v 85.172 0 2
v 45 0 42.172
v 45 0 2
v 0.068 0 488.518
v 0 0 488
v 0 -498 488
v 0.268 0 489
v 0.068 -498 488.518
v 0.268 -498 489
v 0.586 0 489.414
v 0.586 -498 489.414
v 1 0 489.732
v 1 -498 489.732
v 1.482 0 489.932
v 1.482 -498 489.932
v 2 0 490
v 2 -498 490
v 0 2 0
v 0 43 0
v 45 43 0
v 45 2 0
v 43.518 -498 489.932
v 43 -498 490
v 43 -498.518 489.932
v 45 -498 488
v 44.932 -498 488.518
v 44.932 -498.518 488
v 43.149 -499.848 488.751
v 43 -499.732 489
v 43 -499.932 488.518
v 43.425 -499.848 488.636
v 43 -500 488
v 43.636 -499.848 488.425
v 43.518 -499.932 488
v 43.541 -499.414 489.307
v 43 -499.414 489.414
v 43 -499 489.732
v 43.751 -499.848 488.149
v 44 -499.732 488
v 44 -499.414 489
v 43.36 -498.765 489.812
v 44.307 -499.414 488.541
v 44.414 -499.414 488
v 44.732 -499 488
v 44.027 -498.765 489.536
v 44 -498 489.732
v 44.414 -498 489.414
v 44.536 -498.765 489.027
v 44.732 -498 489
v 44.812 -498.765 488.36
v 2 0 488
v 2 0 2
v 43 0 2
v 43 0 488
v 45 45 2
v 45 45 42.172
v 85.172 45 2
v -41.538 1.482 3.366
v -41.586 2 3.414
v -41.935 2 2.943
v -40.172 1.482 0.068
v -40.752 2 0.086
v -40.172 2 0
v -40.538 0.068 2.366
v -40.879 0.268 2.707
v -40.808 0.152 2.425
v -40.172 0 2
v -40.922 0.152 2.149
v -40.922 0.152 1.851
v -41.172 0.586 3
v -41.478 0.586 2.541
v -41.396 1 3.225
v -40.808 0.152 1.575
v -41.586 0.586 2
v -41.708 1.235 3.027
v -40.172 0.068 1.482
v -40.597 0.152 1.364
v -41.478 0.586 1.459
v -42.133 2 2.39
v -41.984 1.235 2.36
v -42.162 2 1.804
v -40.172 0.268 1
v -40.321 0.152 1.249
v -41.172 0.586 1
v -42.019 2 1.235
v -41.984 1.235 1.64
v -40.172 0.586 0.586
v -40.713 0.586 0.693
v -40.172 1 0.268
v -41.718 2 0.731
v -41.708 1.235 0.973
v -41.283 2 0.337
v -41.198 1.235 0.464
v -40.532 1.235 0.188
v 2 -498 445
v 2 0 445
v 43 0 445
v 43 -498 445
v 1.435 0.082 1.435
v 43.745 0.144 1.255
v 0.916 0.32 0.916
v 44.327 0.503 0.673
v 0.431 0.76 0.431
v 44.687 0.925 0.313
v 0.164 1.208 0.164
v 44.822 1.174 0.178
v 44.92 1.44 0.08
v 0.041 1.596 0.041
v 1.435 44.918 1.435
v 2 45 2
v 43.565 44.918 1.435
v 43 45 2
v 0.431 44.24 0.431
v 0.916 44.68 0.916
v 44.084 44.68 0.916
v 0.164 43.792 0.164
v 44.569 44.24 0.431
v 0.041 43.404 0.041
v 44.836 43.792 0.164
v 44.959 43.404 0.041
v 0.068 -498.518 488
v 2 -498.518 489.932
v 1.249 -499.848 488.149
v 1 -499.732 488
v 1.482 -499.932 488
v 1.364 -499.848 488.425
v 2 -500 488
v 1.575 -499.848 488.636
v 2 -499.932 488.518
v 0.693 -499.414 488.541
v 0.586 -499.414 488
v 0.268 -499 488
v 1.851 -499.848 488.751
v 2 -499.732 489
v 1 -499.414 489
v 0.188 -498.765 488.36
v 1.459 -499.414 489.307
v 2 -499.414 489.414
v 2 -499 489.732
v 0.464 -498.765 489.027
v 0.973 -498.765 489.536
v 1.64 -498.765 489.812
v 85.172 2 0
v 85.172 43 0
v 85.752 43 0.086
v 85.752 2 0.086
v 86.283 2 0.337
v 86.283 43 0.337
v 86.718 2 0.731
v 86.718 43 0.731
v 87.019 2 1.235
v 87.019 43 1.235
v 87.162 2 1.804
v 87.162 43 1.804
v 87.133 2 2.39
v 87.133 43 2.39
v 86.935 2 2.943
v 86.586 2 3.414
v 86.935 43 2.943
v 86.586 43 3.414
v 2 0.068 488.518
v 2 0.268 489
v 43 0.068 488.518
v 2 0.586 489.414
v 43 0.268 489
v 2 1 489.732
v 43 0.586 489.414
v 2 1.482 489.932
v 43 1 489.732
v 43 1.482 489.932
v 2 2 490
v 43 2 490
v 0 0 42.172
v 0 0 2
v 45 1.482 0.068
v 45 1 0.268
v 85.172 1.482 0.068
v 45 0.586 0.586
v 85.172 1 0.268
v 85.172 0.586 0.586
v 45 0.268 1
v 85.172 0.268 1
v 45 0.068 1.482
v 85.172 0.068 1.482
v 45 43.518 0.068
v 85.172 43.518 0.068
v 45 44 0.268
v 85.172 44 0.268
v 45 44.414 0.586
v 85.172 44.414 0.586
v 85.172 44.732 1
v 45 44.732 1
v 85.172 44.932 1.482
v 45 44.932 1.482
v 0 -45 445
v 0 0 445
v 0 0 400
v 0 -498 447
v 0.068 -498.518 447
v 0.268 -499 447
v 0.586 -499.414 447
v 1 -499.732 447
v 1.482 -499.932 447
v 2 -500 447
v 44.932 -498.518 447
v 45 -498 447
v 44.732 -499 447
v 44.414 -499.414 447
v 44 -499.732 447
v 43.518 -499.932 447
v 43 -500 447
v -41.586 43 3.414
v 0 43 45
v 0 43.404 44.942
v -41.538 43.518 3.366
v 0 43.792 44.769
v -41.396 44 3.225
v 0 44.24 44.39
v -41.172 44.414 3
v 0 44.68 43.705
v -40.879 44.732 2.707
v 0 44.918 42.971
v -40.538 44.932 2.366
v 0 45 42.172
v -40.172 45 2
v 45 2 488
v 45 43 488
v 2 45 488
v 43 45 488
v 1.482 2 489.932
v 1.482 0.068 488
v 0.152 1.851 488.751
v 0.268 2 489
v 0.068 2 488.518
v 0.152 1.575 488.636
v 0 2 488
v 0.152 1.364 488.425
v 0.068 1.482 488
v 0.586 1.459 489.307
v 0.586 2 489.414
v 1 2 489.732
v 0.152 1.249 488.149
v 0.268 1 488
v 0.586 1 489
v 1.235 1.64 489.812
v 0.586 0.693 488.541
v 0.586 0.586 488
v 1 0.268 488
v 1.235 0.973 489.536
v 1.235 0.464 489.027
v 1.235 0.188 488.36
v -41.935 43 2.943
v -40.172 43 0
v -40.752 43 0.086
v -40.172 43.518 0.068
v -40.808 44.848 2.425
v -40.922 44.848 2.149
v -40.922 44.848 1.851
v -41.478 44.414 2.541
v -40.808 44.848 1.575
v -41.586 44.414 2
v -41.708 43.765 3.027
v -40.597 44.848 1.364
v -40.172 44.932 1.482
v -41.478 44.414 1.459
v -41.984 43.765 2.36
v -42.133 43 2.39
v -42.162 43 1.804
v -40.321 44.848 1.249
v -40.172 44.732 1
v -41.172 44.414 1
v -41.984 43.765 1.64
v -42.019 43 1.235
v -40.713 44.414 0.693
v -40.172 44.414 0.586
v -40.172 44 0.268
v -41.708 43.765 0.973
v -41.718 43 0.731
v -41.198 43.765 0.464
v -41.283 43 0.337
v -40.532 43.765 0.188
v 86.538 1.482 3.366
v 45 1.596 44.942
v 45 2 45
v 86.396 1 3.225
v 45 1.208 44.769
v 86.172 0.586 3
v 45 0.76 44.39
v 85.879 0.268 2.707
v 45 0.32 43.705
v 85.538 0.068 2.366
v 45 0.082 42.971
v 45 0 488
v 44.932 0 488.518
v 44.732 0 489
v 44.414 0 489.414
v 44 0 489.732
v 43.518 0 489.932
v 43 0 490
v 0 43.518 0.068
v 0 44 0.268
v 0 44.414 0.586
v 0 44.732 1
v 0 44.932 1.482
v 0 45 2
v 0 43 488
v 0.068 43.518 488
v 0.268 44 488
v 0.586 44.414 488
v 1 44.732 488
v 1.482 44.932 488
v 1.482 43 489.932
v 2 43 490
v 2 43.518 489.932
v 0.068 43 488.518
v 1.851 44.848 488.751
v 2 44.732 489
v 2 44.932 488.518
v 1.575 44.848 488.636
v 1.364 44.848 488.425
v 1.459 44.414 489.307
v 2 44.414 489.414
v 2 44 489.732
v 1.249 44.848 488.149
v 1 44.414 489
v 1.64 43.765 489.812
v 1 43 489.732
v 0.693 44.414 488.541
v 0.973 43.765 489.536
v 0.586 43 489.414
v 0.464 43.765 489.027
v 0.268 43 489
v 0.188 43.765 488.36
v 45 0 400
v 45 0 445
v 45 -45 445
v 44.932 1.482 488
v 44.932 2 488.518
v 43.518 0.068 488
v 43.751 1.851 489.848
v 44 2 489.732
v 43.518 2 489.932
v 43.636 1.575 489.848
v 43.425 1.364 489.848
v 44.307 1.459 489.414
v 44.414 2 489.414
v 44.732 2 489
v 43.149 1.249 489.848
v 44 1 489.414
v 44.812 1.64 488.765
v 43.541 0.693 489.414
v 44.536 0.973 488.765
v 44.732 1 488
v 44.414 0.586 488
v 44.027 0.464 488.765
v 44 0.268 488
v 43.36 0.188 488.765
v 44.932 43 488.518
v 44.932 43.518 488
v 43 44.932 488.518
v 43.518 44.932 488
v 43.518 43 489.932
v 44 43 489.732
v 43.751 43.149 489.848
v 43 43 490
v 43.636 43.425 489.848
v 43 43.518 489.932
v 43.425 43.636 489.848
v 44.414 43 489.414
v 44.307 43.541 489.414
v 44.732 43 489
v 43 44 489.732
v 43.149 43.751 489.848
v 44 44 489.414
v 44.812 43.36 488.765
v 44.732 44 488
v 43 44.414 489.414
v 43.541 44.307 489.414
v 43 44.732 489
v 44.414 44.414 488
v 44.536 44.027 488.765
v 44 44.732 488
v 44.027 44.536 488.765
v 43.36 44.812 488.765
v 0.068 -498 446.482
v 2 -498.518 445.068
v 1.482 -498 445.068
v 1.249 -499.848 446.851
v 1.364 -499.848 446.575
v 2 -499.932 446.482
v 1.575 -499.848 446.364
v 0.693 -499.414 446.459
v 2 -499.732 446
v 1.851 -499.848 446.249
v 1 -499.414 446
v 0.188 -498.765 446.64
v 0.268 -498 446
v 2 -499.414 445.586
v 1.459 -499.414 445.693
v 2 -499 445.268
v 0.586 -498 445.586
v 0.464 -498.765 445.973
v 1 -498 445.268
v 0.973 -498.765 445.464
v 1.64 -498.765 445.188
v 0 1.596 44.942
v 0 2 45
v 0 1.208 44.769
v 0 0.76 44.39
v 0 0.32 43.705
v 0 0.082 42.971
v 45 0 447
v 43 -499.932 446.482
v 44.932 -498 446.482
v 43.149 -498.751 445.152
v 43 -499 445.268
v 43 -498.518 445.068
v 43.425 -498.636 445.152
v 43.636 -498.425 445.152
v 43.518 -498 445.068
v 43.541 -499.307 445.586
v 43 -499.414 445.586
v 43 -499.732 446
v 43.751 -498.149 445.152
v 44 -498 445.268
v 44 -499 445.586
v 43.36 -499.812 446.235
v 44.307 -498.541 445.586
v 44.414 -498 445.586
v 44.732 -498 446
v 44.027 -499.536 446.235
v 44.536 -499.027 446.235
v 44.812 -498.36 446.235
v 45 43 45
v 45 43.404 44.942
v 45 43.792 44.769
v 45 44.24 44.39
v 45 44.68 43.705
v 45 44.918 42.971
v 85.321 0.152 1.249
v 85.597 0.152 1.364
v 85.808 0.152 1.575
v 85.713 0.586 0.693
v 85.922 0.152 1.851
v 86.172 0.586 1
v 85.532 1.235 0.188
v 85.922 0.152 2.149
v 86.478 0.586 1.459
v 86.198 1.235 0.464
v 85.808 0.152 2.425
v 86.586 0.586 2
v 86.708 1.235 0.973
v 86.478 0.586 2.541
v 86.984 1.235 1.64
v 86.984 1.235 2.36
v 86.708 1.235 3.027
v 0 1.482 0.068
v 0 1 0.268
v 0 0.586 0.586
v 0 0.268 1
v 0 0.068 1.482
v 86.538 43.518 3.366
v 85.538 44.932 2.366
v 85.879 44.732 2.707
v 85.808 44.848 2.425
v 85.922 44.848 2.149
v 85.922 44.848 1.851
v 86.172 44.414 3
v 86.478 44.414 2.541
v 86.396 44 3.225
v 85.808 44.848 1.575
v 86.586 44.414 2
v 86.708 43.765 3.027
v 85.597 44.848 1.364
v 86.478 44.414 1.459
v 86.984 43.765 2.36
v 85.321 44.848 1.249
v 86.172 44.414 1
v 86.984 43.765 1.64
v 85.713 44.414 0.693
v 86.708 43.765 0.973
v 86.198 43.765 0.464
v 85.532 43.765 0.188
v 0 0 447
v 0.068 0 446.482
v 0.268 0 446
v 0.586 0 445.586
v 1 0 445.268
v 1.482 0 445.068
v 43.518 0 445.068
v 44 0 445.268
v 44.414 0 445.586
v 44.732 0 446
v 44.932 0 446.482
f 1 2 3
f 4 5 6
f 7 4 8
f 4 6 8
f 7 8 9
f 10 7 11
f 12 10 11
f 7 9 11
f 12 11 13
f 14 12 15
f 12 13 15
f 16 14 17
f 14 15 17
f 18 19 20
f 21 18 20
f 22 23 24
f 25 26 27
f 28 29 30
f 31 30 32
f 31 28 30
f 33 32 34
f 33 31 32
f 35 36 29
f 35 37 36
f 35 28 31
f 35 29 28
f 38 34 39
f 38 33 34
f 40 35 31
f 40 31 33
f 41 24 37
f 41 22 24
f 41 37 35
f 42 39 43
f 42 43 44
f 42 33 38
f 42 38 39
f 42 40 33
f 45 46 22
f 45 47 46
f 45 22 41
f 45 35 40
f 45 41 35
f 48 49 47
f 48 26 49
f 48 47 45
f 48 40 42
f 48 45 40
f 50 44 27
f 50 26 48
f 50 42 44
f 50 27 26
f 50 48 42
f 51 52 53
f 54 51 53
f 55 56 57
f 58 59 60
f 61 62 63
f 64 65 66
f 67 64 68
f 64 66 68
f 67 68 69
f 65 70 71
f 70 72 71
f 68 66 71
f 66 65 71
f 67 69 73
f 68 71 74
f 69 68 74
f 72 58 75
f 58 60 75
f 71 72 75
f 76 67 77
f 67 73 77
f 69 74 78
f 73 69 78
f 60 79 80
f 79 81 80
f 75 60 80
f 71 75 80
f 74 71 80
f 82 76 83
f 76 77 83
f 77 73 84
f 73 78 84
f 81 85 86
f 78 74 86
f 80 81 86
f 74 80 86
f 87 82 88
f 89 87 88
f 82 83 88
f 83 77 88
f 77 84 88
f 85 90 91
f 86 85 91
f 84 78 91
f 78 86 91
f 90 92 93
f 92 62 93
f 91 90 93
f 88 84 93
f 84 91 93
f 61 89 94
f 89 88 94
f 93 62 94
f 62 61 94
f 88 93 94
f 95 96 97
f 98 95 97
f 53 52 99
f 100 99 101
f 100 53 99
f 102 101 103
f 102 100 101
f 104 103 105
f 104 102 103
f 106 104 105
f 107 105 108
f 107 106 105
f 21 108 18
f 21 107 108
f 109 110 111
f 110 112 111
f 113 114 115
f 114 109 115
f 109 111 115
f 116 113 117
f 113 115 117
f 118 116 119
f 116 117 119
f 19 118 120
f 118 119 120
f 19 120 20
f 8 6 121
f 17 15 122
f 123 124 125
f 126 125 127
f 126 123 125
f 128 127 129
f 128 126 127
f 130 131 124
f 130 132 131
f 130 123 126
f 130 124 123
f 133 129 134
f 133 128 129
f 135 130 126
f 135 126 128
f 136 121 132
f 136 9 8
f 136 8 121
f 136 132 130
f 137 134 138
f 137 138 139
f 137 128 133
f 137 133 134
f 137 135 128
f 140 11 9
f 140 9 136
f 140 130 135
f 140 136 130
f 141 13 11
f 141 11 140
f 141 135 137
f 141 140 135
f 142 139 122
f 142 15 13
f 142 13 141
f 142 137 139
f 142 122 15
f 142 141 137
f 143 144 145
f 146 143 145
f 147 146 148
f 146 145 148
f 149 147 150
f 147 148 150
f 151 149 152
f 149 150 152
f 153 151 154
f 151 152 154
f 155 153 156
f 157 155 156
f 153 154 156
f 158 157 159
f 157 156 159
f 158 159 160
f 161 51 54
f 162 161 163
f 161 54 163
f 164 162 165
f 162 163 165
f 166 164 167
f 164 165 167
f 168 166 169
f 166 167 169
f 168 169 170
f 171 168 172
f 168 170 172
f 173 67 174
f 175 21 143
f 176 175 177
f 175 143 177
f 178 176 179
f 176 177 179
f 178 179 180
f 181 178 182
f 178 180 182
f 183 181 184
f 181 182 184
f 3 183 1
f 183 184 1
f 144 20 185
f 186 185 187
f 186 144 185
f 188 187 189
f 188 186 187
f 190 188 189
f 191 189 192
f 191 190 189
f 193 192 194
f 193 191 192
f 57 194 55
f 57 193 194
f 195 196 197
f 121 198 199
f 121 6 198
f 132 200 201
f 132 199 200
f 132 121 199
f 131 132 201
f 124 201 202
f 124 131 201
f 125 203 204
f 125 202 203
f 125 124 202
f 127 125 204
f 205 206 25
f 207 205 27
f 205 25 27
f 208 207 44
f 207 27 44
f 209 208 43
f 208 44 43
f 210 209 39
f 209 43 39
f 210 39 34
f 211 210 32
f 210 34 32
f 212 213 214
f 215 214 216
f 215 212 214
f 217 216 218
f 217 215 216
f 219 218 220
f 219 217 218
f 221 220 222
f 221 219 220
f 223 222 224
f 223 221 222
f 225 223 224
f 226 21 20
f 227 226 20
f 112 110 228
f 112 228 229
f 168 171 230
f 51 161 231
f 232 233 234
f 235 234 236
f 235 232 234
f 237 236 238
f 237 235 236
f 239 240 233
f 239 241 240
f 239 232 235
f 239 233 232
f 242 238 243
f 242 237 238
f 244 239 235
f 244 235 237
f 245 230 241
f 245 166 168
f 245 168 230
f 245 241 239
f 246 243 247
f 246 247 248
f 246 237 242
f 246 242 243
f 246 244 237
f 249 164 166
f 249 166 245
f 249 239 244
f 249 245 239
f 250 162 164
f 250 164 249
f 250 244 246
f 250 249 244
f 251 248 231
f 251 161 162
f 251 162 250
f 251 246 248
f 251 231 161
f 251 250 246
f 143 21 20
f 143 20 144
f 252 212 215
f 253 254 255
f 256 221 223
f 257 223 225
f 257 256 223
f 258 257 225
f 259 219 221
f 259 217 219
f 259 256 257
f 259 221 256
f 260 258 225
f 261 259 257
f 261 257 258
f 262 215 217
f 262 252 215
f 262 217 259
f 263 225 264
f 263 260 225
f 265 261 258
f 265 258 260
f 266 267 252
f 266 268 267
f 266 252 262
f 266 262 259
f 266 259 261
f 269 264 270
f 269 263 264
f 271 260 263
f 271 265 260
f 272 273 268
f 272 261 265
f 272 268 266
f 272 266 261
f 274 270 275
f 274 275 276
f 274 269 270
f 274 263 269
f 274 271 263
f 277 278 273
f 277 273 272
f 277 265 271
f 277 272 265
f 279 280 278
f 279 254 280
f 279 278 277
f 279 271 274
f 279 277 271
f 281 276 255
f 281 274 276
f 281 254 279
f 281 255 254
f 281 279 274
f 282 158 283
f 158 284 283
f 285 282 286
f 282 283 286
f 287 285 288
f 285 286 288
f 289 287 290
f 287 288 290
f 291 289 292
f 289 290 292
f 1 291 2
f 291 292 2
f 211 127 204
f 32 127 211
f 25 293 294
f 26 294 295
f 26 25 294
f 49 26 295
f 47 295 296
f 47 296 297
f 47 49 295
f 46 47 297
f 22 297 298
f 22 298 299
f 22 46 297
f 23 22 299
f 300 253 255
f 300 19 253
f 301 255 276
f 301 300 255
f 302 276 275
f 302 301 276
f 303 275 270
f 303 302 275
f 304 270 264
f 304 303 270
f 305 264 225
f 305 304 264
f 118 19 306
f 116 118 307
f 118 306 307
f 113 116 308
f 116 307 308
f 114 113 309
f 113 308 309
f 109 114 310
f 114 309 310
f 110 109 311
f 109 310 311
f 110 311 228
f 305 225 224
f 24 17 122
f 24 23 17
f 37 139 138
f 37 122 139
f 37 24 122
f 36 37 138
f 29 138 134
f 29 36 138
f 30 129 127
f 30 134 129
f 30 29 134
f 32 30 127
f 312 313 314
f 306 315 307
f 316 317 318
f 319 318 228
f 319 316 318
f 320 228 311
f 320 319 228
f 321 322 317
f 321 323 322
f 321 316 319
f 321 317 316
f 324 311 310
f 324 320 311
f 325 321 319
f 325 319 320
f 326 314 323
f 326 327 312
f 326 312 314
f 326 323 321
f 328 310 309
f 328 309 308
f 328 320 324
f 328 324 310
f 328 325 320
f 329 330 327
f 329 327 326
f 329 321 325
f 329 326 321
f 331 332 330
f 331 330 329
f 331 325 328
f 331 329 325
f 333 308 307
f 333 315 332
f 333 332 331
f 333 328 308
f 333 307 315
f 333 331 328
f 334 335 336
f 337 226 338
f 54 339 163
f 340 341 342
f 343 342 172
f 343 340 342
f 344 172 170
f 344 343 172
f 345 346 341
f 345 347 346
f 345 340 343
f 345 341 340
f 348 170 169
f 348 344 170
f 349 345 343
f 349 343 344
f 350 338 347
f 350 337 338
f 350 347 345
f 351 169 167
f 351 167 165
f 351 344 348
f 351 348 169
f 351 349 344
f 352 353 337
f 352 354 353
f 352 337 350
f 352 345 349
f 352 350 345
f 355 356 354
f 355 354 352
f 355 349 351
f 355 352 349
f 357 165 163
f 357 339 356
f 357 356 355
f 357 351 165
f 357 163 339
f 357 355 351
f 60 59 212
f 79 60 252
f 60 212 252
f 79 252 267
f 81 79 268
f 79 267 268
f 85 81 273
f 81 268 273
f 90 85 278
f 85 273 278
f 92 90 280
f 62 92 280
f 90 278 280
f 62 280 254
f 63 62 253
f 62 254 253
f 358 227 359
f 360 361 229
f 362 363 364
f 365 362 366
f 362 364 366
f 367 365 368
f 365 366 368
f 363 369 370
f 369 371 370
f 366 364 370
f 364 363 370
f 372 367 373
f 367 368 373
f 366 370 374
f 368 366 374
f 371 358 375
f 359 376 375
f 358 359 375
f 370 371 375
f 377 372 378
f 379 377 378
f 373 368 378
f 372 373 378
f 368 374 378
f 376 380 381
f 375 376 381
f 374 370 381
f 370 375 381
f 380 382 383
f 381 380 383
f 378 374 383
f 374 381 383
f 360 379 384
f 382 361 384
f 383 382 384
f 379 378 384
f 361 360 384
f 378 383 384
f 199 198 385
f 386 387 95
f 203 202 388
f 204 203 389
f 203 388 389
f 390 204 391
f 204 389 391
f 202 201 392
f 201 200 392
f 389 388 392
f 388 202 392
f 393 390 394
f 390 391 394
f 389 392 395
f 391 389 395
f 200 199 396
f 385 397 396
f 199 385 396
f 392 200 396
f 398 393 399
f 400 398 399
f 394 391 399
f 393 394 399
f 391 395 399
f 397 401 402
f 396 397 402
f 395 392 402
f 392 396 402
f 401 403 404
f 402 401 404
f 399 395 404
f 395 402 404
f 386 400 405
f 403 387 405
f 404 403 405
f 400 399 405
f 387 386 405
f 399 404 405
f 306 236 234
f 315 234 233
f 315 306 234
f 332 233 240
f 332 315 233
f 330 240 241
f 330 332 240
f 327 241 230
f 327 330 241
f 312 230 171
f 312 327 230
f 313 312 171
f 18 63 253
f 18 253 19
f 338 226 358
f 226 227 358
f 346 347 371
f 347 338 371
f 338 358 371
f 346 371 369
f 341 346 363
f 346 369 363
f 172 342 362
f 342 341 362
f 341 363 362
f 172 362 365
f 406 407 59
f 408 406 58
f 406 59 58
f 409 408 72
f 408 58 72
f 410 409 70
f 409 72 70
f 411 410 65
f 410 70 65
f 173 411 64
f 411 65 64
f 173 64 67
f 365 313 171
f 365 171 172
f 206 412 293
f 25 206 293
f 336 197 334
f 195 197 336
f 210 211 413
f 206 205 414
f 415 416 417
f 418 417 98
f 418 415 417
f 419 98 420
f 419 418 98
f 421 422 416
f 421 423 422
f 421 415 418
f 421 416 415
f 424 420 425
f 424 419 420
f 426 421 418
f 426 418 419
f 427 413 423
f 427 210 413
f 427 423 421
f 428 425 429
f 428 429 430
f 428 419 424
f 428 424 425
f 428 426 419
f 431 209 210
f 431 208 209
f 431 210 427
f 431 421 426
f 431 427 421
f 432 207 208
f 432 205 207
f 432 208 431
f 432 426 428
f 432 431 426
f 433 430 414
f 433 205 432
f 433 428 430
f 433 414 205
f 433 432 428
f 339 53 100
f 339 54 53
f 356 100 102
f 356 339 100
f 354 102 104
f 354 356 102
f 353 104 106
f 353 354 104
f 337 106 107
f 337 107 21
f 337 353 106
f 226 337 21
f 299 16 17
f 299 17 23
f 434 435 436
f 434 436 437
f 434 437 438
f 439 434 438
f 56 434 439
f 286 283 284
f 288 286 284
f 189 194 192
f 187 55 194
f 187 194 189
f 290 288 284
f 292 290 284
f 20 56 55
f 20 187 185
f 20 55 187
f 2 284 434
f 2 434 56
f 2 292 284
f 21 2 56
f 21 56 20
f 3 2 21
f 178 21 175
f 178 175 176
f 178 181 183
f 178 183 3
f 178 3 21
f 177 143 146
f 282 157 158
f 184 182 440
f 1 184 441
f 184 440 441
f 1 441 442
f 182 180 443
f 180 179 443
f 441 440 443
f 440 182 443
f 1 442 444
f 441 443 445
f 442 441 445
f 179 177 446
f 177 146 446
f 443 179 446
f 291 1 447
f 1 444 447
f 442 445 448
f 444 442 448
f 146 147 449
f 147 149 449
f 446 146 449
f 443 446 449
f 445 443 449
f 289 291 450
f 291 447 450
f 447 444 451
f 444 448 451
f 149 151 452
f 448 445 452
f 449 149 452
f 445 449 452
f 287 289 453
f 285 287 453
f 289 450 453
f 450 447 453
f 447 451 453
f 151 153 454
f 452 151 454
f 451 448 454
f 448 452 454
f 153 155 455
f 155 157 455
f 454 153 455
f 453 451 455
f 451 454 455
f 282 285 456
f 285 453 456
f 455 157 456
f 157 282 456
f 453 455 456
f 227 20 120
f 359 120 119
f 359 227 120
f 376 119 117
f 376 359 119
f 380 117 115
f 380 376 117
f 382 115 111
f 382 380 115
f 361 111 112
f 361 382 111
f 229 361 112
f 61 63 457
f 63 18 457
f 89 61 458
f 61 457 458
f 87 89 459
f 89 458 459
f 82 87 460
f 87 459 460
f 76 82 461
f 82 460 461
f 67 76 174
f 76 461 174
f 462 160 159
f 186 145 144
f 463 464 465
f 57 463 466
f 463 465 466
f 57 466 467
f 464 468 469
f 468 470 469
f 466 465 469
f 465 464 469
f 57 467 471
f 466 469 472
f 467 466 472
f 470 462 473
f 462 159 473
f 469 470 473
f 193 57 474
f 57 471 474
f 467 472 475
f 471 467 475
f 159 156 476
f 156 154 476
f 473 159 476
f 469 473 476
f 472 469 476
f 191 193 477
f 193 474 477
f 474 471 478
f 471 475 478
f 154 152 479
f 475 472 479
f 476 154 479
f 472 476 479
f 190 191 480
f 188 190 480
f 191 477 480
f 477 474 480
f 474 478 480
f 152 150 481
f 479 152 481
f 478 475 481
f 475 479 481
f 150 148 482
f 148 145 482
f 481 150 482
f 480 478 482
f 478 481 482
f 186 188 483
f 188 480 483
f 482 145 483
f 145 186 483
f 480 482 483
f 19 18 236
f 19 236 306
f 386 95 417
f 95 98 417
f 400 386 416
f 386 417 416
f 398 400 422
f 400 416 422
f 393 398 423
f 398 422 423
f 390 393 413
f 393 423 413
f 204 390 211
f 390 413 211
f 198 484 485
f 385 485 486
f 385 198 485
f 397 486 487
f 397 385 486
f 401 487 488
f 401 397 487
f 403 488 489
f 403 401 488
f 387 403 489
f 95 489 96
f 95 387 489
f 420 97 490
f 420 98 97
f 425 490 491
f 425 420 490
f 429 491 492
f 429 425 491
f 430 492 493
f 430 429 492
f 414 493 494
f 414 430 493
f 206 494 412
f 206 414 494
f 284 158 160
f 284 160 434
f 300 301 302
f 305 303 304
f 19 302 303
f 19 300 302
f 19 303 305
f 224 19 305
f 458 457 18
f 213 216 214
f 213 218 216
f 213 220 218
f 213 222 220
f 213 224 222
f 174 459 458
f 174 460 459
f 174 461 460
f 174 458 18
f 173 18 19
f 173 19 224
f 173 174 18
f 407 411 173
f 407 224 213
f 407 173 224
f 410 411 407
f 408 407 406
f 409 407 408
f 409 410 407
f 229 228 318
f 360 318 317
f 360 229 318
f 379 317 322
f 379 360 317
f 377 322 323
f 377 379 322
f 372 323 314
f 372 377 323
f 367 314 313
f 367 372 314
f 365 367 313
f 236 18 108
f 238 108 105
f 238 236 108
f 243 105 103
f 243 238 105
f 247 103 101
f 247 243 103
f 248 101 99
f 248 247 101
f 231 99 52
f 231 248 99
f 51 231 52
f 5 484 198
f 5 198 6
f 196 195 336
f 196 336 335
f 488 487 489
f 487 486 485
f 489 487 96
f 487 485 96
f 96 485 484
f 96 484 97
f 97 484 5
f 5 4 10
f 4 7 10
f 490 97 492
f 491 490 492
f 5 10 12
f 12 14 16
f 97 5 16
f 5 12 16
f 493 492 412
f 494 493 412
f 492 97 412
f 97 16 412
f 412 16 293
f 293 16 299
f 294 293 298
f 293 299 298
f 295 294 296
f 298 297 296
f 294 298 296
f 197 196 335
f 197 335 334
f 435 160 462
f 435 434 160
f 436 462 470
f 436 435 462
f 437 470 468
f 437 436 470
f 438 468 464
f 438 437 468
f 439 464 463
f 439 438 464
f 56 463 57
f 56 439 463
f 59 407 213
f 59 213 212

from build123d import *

# Parameters (mm, degrees)
F0_W     = 45
F0_H     = 45
F1_DEPTH = 490
F3_DEPTH = 45
F4_W     = 45
F4_H     = 45
F5_DEPTH = 500
F6_R     = 2
F6_2_R   = 2
F6_3_R   = 2
F6_4_R   = 2
F8_DEPTH = 45


with BuildPart() as f1:
    # F0 (on Top) → F1 (new body)
    with BuildSketch(Plane.XY):
        with Locations((22.5, 22.5)):
            Rectangle(F0_W, F0_H)
    extrude(amount=F1_DEPTH)

    # F6#2
    f6_2_edges = [f1.edges().sort_by_distance(p)[0] for p in [
        (45, 0, 245),
        (45, 45, 245),
        (45, 22.5, 490),
        (22.5, 0, 490),
        (0, 22.5, 490),
        (22.5, 45, 490),
        (0, 0, 245),
        (0, 45, 245),
        (22.5, 0, 0),
        (22.5, 45, 0),
    ]]
    fillet(f6_2_edges, radius=F6_2_R)


with BuildPart() as f3:
    # F2 (on Front) → F3 (new body)
    with BuildSketch(Plane.XZ):
        Polygon((0, 0), (0, 45), (-45, 0), align=None)
    extrude(amount=-F3_DEPTH)

    # F6#3
    f6_3_edges = [f3.edges().sort_by_distance(p)[0] for p in [
        (-22.5, 0, 22.5),
        (-22.5, 0, 0),
        (-45, 22.5, 0),
        (-22.5, 45, 22.5),
        (-22.5, 45, 0),
    ]]
    fillet(f6_3_edges, radius=F6_3_R)


with BuildPart() as f3b:
    # F2 (on Front) → F3, piece 2 (new body)
    with BuildSketch(Plane.XZ):
        Polygon((45, 45), (45, 0), (90, 0), align=None)
    extrude(amount=-F3_DEPTH)

    # F6#4
    f6_4_edges = [f3b.edges().sort_by_distance(p)[0] for p in [
        (67.5, 0, 0),
        (67.5, 0, 22.5),
        (67.5, 45, 22.5),
        (67.5, 45, 0),
        (90, 22.5, 0),
    ]]
    fillet(f6_4_edges, radius=F6_4_R)


with BuildPart() as f5:
    # F4 (on face) → F5 (new body)
    with BuildSketch(Plane.XZ):
        with Locations((22.5, 467.5)):
            Rectangle(F4_W, F4_H)
    extrude(amount=F5_DEPTH)

    # F6
    f6_edges = [f5.edges().sort_by_distance(p)[0] for p in [
        (0, -250, 490),
        (45, -250, 490),
        (0, -250, 445),
        (0, -500, 467.5),
        (22.5, -500, 490),
        (45, -500, 467.5),
        (22.5, -500, 445),
        (45, -250, 445),
    ]]
    fillet(f6_edges, radius=F6_R)


with BuildPart() as f8:
    # F7 (on face) → F8 (new body)
    with BuildSketch(Plane(origin=(0, 0, 0), x_dir=(0, -1, 0), z_dir=(-1, 0, 0))):
        Polygon((45, 445), (0, 445), (0, 400), align=None)
    extrude(amount=-F8_DEPTH)


solid = Compound([f1.part, f3.part, f3b.part, f5.part, f8.part])
